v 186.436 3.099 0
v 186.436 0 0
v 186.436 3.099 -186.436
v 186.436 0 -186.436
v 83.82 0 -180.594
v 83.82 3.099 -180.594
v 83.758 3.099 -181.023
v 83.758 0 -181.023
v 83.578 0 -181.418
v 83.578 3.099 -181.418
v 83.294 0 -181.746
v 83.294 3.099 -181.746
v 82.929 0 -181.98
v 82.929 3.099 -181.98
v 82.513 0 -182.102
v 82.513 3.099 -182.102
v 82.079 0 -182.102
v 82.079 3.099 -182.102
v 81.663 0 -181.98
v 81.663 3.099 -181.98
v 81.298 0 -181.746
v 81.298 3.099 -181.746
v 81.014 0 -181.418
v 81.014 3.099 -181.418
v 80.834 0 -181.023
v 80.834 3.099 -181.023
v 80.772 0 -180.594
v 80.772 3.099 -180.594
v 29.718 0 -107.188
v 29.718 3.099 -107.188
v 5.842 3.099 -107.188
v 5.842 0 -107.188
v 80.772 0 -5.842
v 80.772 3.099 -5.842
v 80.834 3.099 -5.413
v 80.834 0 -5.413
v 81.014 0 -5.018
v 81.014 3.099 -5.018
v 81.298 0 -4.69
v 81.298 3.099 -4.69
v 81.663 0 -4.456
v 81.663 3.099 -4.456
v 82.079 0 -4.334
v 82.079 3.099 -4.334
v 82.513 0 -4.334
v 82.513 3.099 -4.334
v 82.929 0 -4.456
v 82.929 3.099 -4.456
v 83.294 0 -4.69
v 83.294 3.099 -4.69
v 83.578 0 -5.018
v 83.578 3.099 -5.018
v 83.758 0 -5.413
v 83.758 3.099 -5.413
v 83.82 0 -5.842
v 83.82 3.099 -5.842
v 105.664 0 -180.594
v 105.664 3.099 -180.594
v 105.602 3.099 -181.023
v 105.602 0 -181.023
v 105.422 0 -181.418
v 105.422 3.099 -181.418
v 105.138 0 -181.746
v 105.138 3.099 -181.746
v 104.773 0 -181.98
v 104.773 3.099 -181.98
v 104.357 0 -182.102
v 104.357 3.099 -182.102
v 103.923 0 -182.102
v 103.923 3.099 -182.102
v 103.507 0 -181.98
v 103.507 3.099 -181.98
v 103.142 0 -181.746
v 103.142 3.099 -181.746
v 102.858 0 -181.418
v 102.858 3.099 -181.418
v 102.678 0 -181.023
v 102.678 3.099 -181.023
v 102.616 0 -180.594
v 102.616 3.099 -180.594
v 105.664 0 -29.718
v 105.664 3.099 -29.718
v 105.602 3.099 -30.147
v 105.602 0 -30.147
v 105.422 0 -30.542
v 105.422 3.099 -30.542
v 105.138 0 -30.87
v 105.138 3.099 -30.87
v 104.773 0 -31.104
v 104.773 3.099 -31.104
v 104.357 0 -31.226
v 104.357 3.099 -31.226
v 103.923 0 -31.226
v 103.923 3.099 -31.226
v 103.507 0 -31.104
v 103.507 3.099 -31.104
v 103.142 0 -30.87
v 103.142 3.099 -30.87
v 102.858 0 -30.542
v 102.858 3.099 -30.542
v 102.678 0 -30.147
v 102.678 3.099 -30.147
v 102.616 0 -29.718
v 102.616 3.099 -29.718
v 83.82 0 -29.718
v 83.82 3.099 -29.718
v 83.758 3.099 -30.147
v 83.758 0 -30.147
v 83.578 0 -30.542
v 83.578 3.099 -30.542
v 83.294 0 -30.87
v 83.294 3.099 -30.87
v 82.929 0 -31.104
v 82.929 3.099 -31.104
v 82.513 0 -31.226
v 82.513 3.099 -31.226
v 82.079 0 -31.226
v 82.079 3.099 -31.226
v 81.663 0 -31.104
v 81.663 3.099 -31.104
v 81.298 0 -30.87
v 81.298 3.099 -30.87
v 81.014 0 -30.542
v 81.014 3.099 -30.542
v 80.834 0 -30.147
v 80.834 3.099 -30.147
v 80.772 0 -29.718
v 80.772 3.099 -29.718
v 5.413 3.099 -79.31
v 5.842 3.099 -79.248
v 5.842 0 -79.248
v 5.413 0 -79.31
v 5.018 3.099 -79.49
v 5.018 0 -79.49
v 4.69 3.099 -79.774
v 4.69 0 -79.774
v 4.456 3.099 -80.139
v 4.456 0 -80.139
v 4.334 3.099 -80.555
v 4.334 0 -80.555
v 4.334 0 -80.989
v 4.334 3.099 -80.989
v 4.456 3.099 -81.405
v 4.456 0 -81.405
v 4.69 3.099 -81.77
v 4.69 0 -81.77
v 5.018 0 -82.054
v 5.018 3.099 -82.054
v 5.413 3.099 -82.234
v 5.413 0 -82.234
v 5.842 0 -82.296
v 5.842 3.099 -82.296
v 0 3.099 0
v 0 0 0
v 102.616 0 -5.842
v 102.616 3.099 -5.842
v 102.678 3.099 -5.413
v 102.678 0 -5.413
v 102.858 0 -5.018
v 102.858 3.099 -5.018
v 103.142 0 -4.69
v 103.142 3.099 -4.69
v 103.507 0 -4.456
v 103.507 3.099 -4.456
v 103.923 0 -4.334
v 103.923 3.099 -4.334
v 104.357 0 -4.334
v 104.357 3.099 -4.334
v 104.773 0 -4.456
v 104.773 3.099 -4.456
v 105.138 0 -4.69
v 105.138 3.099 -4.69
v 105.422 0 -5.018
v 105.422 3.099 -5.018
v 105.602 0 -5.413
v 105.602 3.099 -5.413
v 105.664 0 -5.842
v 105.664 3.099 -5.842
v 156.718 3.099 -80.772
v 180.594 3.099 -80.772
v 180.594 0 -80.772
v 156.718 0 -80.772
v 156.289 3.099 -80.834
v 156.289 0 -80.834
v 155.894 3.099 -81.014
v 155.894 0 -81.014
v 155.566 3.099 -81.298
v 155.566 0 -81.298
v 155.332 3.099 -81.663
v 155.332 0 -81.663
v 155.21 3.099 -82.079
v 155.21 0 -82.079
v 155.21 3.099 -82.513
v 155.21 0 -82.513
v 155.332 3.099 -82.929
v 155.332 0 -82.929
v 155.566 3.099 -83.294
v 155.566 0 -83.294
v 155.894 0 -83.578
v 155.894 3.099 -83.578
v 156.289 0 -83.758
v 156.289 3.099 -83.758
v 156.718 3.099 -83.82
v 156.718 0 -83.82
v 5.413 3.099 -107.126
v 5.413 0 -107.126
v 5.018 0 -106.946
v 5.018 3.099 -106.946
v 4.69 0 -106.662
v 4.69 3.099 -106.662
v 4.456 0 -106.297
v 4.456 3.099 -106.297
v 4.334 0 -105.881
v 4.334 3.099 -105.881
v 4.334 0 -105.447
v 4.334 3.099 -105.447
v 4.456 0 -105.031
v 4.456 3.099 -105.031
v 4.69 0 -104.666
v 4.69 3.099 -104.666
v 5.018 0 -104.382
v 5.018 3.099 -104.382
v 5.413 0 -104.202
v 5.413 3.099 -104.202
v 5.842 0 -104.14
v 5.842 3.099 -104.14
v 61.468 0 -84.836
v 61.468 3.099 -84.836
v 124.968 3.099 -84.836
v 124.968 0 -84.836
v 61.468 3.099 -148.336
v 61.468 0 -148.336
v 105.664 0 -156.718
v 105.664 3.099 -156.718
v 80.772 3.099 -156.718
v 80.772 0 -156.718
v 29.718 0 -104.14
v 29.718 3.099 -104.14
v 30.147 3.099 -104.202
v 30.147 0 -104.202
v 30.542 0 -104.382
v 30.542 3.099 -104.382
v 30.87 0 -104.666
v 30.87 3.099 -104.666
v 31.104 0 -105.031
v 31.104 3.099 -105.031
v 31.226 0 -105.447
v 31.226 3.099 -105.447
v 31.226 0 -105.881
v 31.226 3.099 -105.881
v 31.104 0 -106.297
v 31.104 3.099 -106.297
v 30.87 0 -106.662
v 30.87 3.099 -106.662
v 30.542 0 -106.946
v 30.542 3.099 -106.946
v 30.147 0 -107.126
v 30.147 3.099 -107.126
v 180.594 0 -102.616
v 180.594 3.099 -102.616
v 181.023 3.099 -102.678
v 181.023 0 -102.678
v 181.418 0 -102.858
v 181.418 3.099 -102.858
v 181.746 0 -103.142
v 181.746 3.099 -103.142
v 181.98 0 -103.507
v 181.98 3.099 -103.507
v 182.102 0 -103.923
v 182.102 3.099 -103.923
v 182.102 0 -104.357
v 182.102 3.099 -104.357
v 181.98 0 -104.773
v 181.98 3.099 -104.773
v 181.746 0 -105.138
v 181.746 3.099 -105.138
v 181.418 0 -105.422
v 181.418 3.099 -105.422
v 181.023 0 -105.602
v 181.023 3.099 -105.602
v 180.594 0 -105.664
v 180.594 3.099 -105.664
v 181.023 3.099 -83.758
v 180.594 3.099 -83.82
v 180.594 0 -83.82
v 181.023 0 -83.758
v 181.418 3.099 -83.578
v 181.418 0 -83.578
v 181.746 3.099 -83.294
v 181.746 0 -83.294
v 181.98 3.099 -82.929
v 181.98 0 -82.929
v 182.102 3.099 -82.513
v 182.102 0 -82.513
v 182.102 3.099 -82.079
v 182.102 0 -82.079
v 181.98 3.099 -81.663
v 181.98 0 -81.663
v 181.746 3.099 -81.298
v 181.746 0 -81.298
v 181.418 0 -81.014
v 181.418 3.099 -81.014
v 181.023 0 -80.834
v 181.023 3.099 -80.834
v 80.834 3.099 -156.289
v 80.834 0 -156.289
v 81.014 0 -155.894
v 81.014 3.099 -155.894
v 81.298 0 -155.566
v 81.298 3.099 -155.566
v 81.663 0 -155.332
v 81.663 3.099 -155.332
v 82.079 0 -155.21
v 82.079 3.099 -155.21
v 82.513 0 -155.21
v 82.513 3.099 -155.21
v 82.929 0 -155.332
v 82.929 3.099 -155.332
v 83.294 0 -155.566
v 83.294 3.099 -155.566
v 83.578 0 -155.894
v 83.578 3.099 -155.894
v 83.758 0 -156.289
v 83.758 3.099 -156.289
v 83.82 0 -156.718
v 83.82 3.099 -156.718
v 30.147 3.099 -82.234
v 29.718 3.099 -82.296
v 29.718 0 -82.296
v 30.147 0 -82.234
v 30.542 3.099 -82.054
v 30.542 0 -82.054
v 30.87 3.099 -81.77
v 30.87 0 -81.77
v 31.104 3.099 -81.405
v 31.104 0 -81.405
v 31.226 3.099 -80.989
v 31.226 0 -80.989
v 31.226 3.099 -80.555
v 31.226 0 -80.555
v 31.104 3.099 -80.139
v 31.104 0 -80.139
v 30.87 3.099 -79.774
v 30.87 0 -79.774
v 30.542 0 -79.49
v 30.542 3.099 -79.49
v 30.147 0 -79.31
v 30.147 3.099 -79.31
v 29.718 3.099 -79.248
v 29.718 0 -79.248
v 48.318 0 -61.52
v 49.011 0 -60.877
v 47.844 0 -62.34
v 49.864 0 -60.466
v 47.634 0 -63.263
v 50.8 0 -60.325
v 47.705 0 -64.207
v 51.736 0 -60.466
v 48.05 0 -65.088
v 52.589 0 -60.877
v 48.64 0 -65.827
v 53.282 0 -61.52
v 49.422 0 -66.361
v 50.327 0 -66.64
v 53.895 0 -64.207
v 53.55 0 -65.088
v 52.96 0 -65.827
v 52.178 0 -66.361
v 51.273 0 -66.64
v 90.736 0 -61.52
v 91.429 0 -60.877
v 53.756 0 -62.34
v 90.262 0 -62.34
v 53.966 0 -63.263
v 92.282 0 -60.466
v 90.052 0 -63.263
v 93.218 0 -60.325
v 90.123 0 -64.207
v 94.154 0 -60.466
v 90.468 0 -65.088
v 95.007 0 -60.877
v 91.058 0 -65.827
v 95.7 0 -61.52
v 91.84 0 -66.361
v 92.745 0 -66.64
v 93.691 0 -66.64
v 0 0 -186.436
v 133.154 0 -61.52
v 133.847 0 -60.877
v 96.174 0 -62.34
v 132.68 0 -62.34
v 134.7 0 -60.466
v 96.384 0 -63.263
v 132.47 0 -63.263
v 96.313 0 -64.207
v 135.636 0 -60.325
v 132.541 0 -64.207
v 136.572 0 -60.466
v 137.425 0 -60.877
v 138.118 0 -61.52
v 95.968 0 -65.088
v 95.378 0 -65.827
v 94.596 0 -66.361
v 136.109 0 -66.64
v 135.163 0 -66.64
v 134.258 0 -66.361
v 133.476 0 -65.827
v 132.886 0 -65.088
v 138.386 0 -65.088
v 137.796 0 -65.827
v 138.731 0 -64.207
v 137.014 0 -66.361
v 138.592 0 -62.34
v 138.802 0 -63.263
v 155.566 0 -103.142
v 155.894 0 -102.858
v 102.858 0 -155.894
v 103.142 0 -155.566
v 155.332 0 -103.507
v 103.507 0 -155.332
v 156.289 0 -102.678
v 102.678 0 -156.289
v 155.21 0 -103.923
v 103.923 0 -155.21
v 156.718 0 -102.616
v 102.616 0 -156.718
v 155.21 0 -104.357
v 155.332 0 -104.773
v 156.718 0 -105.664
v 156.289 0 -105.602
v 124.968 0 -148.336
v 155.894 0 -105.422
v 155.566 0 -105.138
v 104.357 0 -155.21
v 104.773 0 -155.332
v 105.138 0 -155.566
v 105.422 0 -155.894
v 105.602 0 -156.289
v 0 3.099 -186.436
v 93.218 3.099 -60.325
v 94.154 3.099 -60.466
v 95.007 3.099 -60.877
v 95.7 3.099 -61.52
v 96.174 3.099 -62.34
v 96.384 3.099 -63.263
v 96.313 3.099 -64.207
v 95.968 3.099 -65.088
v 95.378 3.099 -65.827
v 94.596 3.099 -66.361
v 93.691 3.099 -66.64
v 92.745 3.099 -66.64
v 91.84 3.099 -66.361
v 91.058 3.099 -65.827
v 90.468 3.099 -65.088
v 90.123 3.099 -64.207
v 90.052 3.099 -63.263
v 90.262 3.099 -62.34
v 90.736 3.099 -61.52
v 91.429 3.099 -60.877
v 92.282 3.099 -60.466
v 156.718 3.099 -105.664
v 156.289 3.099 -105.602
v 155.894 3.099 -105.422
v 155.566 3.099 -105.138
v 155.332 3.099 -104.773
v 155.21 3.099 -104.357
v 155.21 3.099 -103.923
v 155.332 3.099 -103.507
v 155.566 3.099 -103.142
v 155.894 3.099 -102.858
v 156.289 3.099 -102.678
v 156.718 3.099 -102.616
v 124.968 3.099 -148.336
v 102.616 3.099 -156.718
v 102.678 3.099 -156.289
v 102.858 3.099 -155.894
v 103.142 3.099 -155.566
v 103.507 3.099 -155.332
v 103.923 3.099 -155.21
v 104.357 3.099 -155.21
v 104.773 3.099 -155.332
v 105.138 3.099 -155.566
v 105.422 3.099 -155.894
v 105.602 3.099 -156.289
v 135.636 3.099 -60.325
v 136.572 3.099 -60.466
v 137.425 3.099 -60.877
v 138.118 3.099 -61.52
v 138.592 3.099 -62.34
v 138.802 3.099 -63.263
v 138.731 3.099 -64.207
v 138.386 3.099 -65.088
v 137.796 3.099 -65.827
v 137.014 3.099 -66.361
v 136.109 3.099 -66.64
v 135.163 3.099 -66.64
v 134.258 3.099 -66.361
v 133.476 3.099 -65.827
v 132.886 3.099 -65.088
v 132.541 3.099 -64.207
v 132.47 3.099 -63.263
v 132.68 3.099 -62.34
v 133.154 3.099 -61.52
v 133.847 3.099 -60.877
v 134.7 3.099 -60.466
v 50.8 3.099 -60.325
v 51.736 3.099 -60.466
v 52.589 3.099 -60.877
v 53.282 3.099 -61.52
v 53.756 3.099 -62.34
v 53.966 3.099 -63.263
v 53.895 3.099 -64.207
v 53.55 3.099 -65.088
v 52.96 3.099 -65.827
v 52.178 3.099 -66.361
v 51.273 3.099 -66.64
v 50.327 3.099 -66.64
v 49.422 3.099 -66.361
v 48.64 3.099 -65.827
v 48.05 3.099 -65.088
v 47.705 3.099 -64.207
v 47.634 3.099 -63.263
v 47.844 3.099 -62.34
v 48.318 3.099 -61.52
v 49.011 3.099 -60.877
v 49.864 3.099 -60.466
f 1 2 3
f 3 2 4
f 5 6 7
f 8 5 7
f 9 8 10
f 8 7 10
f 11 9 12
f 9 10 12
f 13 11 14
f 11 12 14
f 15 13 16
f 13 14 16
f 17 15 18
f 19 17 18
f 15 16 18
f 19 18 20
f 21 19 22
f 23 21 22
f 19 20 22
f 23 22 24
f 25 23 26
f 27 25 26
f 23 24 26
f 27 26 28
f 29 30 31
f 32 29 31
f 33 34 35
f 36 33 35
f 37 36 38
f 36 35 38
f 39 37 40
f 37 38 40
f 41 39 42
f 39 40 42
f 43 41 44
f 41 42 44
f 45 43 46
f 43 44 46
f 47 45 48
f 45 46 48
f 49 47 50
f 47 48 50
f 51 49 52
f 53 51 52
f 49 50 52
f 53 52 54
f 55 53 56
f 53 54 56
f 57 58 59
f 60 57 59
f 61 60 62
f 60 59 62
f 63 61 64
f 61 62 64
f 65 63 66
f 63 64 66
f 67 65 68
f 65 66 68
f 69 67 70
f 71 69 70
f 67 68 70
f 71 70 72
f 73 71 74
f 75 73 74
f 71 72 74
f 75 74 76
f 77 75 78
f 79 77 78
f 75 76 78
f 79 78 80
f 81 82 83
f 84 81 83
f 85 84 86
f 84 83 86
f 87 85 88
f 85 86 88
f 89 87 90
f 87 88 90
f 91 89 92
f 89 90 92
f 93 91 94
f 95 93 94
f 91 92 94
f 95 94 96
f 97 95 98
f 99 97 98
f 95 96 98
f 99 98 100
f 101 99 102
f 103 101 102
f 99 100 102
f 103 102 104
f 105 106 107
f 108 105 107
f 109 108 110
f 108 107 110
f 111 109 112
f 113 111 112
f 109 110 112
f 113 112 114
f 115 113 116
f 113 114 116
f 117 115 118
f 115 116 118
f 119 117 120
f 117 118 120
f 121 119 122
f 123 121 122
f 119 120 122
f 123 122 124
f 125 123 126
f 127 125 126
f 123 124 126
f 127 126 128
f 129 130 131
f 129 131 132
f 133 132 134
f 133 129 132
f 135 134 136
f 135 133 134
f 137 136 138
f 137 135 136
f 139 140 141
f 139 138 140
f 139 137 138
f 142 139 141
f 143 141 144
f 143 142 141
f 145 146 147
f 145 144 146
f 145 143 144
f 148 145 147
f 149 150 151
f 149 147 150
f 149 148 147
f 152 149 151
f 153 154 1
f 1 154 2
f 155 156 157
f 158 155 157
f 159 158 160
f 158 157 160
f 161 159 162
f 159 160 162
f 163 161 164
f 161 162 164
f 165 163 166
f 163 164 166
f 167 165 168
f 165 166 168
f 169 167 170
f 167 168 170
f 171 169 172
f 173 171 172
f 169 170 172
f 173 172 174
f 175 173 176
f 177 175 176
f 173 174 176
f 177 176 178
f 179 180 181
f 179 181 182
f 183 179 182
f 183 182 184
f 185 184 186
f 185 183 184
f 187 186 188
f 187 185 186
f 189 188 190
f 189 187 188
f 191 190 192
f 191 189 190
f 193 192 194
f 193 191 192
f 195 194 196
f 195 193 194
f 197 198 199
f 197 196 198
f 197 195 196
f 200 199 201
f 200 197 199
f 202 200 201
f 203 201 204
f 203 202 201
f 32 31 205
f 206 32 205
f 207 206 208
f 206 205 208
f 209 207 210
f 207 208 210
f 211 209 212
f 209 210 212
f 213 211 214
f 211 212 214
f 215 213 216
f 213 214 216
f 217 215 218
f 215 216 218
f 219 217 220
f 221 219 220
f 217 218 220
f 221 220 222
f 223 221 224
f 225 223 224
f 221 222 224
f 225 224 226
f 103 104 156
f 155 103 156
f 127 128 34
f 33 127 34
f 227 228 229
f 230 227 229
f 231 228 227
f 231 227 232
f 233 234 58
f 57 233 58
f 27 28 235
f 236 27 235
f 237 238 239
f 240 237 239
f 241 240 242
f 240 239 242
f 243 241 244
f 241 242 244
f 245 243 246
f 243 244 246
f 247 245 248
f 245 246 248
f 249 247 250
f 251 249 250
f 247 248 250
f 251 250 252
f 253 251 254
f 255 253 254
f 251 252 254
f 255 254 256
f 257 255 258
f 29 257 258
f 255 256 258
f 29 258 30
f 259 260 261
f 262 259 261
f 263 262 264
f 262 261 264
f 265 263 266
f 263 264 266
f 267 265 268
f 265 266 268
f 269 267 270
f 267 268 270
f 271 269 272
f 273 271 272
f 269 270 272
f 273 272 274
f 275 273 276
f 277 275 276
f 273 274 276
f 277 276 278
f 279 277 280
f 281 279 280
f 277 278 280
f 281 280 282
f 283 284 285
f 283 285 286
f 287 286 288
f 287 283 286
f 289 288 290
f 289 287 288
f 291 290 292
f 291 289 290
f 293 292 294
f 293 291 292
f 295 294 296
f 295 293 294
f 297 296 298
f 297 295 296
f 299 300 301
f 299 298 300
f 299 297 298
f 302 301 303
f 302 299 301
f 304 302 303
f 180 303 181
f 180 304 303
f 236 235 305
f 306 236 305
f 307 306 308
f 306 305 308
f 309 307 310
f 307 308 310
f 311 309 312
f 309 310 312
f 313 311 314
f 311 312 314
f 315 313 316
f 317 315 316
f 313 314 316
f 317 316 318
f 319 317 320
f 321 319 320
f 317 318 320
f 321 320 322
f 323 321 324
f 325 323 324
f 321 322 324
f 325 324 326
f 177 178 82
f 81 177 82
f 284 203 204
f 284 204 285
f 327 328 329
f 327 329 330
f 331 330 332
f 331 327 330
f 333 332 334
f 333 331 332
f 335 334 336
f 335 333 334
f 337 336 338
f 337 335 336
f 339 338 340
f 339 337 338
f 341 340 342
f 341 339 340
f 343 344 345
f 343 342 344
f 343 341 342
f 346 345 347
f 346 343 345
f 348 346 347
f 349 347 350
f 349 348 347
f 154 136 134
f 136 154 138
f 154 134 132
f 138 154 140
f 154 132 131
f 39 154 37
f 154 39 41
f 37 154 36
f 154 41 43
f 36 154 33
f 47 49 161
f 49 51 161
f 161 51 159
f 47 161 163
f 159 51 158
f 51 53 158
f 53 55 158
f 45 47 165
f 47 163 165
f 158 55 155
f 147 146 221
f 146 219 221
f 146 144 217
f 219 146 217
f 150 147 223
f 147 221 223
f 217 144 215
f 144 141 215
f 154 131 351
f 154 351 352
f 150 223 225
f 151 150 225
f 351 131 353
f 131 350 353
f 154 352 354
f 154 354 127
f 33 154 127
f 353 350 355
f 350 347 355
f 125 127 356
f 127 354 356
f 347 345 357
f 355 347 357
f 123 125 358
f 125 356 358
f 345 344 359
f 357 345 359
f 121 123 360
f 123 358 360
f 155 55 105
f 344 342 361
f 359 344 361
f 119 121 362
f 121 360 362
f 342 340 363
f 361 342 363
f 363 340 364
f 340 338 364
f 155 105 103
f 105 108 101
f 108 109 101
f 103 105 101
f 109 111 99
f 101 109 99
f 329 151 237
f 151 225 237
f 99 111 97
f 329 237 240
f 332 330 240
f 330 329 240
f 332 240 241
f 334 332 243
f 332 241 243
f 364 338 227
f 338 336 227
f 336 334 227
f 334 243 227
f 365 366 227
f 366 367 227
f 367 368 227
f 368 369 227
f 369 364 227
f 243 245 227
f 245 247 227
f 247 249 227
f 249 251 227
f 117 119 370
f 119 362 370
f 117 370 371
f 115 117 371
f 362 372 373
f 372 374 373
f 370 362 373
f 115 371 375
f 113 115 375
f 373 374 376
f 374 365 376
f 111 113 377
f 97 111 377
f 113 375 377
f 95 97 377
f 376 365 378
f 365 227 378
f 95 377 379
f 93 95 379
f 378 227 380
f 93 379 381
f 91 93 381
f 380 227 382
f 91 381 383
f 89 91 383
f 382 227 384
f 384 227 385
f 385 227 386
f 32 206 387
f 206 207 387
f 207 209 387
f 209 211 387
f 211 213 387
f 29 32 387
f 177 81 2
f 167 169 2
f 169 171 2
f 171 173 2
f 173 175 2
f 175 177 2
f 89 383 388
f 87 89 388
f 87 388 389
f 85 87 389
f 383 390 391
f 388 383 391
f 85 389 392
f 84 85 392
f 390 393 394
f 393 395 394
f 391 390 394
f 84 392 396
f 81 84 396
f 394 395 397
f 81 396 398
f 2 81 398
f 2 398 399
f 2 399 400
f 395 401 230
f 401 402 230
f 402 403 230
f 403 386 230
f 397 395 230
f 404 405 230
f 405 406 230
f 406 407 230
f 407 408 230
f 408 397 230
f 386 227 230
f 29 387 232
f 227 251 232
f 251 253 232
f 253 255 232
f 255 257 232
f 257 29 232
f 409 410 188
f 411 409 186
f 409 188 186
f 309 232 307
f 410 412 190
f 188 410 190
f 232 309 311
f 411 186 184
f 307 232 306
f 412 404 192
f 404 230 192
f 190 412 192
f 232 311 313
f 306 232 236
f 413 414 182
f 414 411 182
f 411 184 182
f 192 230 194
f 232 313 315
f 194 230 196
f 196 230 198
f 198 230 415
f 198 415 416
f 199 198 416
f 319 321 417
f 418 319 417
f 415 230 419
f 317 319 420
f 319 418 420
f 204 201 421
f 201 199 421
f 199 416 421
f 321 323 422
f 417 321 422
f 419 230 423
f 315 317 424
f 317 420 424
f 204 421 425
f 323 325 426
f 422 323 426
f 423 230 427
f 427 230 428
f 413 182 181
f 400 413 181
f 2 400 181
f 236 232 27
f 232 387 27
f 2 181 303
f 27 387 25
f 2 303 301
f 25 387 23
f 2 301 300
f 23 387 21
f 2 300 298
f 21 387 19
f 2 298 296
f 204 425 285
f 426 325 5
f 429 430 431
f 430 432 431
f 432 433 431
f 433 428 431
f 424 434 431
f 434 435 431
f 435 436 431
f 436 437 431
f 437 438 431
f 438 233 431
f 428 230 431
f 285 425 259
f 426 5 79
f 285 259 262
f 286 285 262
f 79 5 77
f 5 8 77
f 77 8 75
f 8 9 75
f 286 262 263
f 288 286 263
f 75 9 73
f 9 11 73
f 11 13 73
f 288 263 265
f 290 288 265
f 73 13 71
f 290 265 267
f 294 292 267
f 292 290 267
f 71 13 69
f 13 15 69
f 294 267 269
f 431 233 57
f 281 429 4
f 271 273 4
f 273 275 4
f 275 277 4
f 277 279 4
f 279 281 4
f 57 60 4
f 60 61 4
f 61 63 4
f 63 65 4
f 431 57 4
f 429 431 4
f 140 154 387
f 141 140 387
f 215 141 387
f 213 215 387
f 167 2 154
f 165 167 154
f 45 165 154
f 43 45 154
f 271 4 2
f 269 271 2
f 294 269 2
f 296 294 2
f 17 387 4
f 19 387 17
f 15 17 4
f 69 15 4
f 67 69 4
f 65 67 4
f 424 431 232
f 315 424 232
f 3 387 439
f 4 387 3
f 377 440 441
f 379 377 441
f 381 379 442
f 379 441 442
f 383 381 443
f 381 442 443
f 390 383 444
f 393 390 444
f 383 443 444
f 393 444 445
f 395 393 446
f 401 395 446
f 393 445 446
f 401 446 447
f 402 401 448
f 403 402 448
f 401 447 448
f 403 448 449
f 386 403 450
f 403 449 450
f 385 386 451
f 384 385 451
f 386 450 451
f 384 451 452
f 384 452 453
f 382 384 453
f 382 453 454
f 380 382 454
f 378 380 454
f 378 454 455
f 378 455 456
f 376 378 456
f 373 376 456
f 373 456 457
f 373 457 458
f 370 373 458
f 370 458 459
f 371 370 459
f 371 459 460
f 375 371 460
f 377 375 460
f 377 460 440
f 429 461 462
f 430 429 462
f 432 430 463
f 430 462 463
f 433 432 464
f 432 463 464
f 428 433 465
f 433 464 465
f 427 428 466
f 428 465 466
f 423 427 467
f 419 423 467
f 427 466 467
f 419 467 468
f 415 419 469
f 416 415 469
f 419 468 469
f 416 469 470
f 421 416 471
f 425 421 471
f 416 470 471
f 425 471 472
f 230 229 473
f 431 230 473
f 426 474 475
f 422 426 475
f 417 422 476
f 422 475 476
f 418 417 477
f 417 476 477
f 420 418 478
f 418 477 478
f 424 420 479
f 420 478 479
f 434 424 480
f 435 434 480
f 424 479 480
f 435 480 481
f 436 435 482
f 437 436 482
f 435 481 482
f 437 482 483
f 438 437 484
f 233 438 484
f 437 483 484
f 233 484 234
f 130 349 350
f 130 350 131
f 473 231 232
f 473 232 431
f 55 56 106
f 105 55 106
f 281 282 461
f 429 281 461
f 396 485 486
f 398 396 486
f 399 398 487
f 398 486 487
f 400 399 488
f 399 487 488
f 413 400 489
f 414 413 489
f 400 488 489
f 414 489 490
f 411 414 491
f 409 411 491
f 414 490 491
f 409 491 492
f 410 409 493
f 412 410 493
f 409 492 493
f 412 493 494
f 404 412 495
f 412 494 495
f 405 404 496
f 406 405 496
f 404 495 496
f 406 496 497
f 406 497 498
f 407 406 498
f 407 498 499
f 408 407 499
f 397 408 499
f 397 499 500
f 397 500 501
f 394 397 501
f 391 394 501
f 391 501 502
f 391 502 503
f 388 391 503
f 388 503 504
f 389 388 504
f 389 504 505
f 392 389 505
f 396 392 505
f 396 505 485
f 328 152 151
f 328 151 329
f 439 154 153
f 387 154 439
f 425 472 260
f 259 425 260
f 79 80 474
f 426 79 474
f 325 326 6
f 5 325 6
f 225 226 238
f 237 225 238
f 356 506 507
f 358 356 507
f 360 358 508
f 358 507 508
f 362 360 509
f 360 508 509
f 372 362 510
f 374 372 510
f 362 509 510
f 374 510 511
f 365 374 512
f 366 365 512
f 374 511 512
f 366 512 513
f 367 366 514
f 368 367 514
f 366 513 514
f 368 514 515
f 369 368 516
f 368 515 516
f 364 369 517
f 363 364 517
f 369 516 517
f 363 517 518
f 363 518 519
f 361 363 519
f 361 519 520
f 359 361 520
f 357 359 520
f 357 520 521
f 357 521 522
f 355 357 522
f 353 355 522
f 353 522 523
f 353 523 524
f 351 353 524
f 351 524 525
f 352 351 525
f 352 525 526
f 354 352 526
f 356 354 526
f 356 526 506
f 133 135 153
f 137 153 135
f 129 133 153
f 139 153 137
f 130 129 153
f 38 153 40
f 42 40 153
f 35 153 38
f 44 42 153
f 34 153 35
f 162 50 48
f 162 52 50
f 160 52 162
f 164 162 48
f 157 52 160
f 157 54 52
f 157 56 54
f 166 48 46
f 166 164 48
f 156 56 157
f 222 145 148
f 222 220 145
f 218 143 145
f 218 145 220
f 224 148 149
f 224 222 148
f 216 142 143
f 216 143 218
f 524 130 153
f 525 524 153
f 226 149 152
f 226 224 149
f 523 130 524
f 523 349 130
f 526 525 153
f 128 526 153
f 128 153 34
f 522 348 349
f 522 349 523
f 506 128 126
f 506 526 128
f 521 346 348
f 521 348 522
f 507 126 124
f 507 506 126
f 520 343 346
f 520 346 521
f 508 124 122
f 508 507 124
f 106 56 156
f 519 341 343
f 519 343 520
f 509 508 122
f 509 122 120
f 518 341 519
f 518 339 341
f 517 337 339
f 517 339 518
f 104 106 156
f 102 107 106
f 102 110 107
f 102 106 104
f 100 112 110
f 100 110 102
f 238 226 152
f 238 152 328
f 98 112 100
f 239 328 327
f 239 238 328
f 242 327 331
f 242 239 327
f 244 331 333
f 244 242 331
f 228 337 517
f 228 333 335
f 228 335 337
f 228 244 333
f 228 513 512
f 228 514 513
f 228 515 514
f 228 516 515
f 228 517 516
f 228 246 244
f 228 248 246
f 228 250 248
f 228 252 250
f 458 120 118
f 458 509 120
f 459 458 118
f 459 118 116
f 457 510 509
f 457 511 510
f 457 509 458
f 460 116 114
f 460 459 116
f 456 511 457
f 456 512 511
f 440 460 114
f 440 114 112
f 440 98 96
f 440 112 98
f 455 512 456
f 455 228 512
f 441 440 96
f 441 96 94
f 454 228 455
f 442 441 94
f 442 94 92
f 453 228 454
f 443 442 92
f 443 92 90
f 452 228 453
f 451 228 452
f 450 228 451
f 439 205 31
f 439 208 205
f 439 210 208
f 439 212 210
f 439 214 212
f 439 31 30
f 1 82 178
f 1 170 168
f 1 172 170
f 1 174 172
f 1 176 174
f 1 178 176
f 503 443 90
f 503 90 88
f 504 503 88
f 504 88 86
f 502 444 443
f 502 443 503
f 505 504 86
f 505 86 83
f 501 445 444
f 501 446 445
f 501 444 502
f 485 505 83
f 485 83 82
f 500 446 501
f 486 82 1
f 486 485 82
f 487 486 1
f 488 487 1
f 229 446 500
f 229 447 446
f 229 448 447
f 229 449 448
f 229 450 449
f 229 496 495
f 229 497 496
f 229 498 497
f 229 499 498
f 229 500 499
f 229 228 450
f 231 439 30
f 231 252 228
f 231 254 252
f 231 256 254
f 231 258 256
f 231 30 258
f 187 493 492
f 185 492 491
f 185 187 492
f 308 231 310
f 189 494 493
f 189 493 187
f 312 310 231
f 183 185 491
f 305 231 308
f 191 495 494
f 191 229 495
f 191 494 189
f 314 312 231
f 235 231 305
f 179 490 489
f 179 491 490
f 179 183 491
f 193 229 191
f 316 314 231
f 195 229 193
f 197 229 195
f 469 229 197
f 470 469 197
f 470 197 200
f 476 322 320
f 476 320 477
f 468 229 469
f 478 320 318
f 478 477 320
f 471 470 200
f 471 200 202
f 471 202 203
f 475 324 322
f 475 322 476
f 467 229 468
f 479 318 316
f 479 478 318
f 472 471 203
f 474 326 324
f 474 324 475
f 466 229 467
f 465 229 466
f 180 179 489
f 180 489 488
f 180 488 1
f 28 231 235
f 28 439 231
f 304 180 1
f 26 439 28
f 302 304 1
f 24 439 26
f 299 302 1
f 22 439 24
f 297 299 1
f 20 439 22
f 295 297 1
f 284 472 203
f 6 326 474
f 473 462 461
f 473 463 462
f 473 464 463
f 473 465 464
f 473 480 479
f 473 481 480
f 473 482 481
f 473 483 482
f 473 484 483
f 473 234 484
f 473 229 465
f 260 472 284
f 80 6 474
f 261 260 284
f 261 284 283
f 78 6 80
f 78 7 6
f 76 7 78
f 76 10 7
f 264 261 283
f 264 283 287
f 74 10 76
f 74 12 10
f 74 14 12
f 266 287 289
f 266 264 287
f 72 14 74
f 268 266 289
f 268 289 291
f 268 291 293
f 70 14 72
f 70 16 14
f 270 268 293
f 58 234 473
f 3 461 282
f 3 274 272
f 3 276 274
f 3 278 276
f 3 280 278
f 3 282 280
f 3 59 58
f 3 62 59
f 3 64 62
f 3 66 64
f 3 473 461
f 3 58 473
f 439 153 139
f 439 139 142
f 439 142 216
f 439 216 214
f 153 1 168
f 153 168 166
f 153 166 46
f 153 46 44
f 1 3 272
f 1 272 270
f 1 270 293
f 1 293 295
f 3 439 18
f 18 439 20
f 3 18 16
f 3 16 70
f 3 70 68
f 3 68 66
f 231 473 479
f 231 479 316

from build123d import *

# Parameters (mm, degrees)
SKETCH3_W           = 186.436
SKETCH3_H           = 186.436
BOSS_EXTRUDE1_DEPTH = 3.0988
CUT_EXTRUDE1_DEPTH  = 264.678529186
CUT_EXTRUDE2_REACH  = 265.679
SKETCH5_R           = 3.175
SKETCH5_W           = 63.5
SKETCH5_H           = 63.5


with BuildPart() as part:
    # Sketch3 → Boss-Extrude1 (new body)
    with BuildSketch(Plane(origin=(0, 0, 0), x_dir=(1, 0, 0), z_dir=(0, 1, 0))):
        with Locations((93.218, 93.218)):
            Rectangle(SKETCH3_W, SKETCH3_H)
    extrude(amount=BOSS_EXTRUDE1_DEPTH)

    # Sketch4 → Cut-Extrude1 (cut, through all)
    with BuildSketch(Plane(origin=(0, 3.0988, 0), x_dir=(1, 0, 0), z_dir=(0, 1, 0))):
        with BuildLine():
            Line((5.842, 82.296), (29.718, 82.296))
            ThreePointArc((29.718, 82.296), (31.242, 80.772), (29.718, 79.248))
            Line((29.718, 79.248), (5.842, 79.248))
            ThreePointArc((5.842, 79.248), (4.318, 80.772), (5.842, 82.296))
        make_face()
        with BuildLine():
            Line((5.842, 104.14), (29.718, 104.14))
            ThreePointArc((29.718, 104.14), (31.242, 105.664), (29.718, 107.188))
            Line((29.718, 107.188), (5.842, 107.188))
            ThreePointArc((5.842, 107.188), (4.318, 105.664), (5.842, 104.14))
        make_face()
        with BuildLine():
            Line((80.772, 29.718), (80.772, 5.842))
            ThreePointArc((80.772, 5.842), (82.296, 4.318), (83.82, 5.842))
            Line((83.82, 5.842), (83.82, 29.718))
            ThreePointArc((83.82, 29.718), (82.296, 31.242), (80.772, 29.718))
        make_face()
        with BuildLine():
            Line((105.664, 5.842), (105.664, 29.718))
            ThreePointArc((105.664, 29.718), (104.14, 31.242), (102.616, 29.718))
            Line((102.616, 29.718), (102.616, 5.842))
            ThreePointArc((102.616, 5.842), (104.14, 4.318), (105.664, 5.842))
        make_face()
        with BuildLine():
            Line((156.718, 83.82), (180.594, 83.82))
            ThreePointArc((180.594, 83.82), (182.118, 82.296), (180.594, 80.772))
            Line((180.594, 80.772), (156.718, 80.772))
            ThreePointArc((156.718, 80.772), (155.194, 82.296), (156.718, 83.82))
        make_face()
        with BuildLine():
            Line((156.718, 102.616), (180.594, 102.616))
            ThreePointArc((180.594, 102.616), (182.118, 104.14), (180.594, 105.664))
            Line((180.594, 105.664), (156.718, 105.664))
            ThreePointArc((156.718, 105.664), (155.194, 104.14), (156.718, 102.616))
        make_face()
        with BuildLine():
            Line((80.772, 180.594), (80.772, 156.718))
            ThreePointArc((80.772, 156.718), (82.296, 155.194), (83.82, 156.718))
            Line((83.82, 156.718), (83.82, 180.594))
            ThreePointArc((83.82, 180.594), (82.296, 182.118), (80.772, 180.594))
        make_face()
        with BuildLine():
            Line((105.664, 156.718), (105.664, 180.594))
            ThreePointArc((105.664, 180.594), (104.14, 182.118), (102.616, 180.594))
            Line((102.616, 180.594), (102.616, 156.718))
            ThreePointArc((102.616, 156.718), (104.14, 155.194), (105.664, 156.718))
        make_face()
    extrude(amount=-CUT_EXTRUDE1_DEPTH, mode=Mode.SUBTRACT)

    # Sketch5 → Cut-Extrude2 (cut, up to next)
    with BuildSketch(Plane(origin=(0, 3.0988, 0), x_dir=(1, 0, 0), z_dir=(0, 1, 0)), mode=Mode.PRIVATE) as cut_extrude2_sk1:
        with Locations(Location((50.8, 63.5, 0), (0, 0, 270))):
            Circle(SKETCH5_R)
    cut_extrude2_tool1 = extrude(cut_extrude2_sk1.sketch, amount=-CUT_EXTRUDE2_REACH, mode=Mode.PRIVATE) & part.part
    # Sketch5 → Cut-Extrude2 (cut, up to next)
    with BuildSketch(Plane(origin=(0, 3.0988, 0), x_dir=(1, 0, 0), z_dir=(0, 1, 0)), mode=Mode.PRIVATE) as cut_extrude2_sk2:
        with Locations(Location((93.218, 63.5, 0), (0, 0, 270))):
            Circle(SKETCH5_R)
    cut_extrude2_tool2 = extrude(cut_extrude2_sk2.sketch, amount=-CUT_EXTRUDE2_REACH, mode=Mode.PRIVATE) & part.part
    # Sketch5 → Cut-Extrude2 (cut, up to next)
    with BuildSketch(Plane(origin=(0, 3.0988, 0), x_dir=(1, 0, 0), z_dir=(0, 1, 0)), mode=Mode.PRIVATE) as cut_extrude2_sk3:
        with Locations(Location((135.636, 63.5, 0), (0, 0, 270))):
            Circle(SKETCH5_R)
    cut_extrude2_tool3 = extrude(cut_extrude2_sk3.sketch, amount=-CUT_EXTRUDE2_REACH, mode=Mode.PRIVATE) & part.part
    # Sketch5 → Cut-Extrude2 (cut, up to next)
    with BuildSketch(Plane(origin=(0, 3.0988, 0), x_dir=(1, 0, 0), z_dir=(0, 1, 0)), mode=Mode.PRIVATE) as cut_extrude2_sk4:
        with Locations((93.218, 116.586)):
            Rectangle(SKETCH5_W, SKETCH5_H)
    cut_extrude2_tool4 = extrude(cut_extrude2_sk4.sketch, amount=-CUT_EXTRUDE2_REACH, mode=Mode.PRIVATE) & part.part
    add(cut_extrude2_tool1.solids().sort_by_distance((50.8, 3.0988, -63.5))[0], mode=Mode.SUBTRACT)
    add(cut_extrude2_tool2.solids().sort_by_distance((93.218, 3.0988, -63.5))[0], mode=Mode.SUBTRACT)
    add(cut_extrude2_tool3.solids().sort_by_distance((135.636, 3.0988, -63.5))[0], mode=Mode.SUBTRACT)
    add(cut_extrude2_tool4.solids().sort_by_distance((93.218, 3.0988, -116.586))[0], mode=Mode.SUBTRACT)


solid = part.part
